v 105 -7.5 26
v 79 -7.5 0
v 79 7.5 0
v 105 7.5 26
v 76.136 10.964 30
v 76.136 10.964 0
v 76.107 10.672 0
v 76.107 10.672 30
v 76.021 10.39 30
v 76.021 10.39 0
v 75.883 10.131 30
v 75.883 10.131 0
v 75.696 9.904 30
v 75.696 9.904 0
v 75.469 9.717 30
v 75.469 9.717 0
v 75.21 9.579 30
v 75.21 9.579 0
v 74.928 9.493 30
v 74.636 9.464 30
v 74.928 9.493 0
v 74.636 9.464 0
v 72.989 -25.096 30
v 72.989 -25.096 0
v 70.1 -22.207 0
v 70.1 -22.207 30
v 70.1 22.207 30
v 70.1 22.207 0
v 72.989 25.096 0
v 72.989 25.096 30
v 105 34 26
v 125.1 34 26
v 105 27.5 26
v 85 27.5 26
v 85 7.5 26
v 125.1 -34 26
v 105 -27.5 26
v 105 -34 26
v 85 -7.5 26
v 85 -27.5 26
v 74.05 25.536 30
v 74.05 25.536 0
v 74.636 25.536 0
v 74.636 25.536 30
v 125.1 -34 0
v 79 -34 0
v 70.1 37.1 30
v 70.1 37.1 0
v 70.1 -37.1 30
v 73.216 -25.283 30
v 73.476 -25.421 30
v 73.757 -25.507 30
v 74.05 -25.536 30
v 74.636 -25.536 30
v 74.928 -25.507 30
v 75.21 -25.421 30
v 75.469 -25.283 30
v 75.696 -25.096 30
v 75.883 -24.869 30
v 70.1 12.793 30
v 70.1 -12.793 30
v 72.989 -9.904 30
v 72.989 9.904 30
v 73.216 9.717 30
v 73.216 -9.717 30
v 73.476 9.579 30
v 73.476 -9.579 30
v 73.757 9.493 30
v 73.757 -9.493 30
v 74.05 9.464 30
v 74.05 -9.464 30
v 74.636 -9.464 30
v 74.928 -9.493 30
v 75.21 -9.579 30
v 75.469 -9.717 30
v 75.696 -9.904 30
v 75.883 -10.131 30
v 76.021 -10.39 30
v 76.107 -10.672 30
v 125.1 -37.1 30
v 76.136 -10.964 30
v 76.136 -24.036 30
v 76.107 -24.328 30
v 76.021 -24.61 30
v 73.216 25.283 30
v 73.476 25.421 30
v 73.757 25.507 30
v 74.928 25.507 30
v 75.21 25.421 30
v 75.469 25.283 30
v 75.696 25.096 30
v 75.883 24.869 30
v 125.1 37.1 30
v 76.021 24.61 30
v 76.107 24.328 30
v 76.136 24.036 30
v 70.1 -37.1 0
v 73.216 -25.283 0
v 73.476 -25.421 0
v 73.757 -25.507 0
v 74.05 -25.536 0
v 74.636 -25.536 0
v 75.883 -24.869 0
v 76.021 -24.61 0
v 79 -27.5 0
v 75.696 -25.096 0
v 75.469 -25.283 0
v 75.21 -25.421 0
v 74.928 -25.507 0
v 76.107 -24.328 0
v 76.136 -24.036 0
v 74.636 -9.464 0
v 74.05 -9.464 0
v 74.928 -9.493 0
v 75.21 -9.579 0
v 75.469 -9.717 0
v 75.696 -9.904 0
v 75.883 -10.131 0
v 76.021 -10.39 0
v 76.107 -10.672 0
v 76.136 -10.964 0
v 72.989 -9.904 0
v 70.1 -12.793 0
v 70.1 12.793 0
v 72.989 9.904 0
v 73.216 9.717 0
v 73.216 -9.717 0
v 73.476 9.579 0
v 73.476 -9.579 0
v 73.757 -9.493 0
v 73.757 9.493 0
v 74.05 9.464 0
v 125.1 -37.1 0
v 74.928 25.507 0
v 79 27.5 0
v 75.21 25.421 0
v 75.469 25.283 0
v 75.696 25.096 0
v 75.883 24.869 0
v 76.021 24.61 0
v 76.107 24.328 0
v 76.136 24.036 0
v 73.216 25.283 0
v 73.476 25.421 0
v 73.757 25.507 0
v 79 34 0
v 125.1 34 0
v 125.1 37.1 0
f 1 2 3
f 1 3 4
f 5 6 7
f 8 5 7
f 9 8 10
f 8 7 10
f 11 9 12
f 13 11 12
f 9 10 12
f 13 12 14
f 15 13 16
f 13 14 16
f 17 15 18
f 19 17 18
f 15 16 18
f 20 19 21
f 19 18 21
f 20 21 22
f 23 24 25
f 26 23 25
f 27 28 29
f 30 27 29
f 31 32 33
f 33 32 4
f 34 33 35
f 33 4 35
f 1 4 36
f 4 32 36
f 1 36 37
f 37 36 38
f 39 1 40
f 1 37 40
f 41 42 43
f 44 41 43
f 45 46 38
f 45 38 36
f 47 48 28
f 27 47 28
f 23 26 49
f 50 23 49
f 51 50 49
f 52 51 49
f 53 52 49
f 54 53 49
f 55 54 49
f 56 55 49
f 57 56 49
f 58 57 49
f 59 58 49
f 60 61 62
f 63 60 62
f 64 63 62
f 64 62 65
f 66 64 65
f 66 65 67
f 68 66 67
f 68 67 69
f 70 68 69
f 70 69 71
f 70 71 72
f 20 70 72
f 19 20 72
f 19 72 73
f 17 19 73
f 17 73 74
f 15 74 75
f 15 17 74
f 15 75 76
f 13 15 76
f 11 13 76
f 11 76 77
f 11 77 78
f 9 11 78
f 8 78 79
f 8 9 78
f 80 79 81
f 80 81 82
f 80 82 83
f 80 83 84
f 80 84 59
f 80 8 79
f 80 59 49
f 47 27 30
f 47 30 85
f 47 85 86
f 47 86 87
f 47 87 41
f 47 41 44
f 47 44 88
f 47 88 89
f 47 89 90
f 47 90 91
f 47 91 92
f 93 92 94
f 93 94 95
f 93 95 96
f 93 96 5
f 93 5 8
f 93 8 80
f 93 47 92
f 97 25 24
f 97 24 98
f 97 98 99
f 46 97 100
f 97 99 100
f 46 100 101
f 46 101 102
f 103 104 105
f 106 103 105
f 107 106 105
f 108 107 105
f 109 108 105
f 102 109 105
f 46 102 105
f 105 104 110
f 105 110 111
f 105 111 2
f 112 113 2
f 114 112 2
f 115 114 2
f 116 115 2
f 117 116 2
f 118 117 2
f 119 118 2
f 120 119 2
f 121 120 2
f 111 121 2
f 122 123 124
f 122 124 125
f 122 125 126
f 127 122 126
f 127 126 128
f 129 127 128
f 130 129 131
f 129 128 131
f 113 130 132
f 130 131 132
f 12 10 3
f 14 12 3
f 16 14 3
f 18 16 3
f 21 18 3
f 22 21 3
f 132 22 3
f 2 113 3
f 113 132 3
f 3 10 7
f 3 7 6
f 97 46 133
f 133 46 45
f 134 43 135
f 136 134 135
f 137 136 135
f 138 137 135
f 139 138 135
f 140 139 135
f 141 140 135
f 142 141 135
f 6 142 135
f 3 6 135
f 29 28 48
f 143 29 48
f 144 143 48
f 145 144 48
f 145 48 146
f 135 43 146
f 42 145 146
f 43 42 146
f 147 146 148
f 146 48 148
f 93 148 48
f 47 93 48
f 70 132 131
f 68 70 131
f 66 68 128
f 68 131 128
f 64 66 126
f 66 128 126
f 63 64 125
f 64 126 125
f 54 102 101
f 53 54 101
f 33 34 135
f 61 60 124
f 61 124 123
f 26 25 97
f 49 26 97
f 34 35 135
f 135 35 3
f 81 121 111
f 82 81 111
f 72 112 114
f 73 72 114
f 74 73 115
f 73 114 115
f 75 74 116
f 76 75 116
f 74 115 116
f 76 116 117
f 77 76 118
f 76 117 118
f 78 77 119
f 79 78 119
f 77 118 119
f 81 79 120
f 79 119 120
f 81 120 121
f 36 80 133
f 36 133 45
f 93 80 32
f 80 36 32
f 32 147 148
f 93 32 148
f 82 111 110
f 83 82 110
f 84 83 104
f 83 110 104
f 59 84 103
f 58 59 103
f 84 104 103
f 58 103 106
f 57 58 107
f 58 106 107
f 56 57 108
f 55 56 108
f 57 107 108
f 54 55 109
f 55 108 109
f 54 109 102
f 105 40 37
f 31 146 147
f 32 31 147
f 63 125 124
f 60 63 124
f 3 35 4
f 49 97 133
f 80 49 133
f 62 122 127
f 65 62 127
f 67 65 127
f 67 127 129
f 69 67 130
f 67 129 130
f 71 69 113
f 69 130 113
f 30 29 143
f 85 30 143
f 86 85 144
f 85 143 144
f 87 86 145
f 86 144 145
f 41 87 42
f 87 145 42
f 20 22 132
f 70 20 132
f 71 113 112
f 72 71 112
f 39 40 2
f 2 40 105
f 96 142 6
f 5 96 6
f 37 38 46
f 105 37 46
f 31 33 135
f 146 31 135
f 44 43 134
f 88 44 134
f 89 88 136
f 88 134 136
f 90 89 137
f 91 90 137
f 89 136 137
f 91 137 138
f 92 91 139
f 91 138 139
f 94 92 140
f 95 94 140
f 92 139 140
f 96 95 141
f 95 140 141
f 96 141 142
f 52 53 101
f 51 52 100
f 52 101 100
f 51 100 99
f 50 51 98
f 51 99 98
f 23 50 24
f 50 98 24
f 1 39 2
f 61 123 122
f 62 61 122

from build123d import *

# Parameters (mm, degrees)
F0_W     = 2.1
F0_H     = 2.1
F1_DEPTH = 30
F4_DEPTH = 34
F5_DEPTH = 27.5
F6_DEPTH = 7.5


with BuildPart() as f1:
    # F0 (on Top) → F1 (new body)
    with BuildSketch(Plane.XY):
        with BuildLine():
            Line((86, -35), (90, -35))
            Line((90, -35), (90, -23))
            Line((90, -23), (90, 23))
            Line((90, 23), (90, 35))
            Line((90, 35), (86, 35))
            Line((86, 35), (80, 35))
            Line((80, 35), (70.1, 35))
            Line((70.1, 35), (70.1, 22.207107))
            Line((70.1, 22.207107), (72.989087, 25.096194))
            ThreePointArc((72.989087, 25.096194), (73.475722, 25.421353), (74.049747, 25.535534))
            Line((74.049747, 25.535534), (74.635534, 25.535534))
            ThreePointArc((74.635534, 25.535534), (75.696194, 25.096194), (76.135534, 24.035534))
            Line((76.135534, 24.035534), (76.135534, 10.964466))
            ThreePointArc((76.135534, 10.964466), (75.696194, 9.903806), (74.635534, 9.464466))
            Line((74.635534, 9.464466), (74.049747, 9.464466))
            ThreePointArc((74.049747, 9.464466), (73.475722, 9.578647), (72.989087, 9.903806))
            Line((72.989087, 9.903806), (70.1, 12.792893))
            Line((70.1, 12.792893), (70.1, -12.792893))
            Line((70.1, -12.792893), (72.989087, -9.903806))
            ThreePointArc((72.989087, -9.903806), (73.475722, -9.578647), (74.049747, -9.464466))
            Line((74.049747, -9.464466), (74.635534, -9.464466))
            ThreePointArc((74.635534, -9.464466), (75.696194, -9.903806), (76.135534, -10.964466))
            Line((76.135534, -10.964466), (76.135534, -24.035534))
            ThreePointArc((76.135534, -24.035534), (75.696194, -25.096194), (74.635534, -25.535534))
            Line((74.635534, -25.535534), (74.049747, -25.535534))
            ThreePointArc((74.049747, -25.535534), (73.475722, -25.421353), (72.989087, -25.096194))
            Line((72.989087, -25.096194), (70.1, -22.207107))
            Line((70.1, -22.207107), (70.1, -35))
            Line((70.1, -35), (80, -35))
            Line((80, -35), (86, -35))
        make_face()
        Polygon((86, 35), (90, 35), (90, 37.1), (70.1, 37.1), (70.1, 35), (80, 35), align=None)
        Polygon((90, -23), (90, -35), (92.1, -35), (92.1, 35), (90, 35), (90, 23), align=None)
        with Locations((91.05, 36.05)):
            Rectangle(F0_W, F0_H)
        Polygon((92.1, 35), (92.1, -35), (92.1, -37.1), (125.1, -37.1), (125.1, 37.1), (92.1, 37.1), align=None)
        Polygon((90, -37.1), (90, -35), (86, -35), (80, -35), (70.1, -35), (70.1, -37.1), align=None)
        with Locations((91.05, -36.05)):
            Rectangle(F0_W, F0_H)
    extrude(amount=F1_DEPTH)

    # F3 (on Front) → F4 (cut, symmetric)
    with BuildSketch(Plane.XZ):
        Polygon((105, 26), (79, 0), (125.1, 0), (125.1, 26), align=None)
    extrude(amount=F4_DEPTH, both=True, mode=Mode.SUBTRACT)

    # F3 (on Front) → F5 (cut, symmetric)
    with BuildSketch(Plane.XZ):
        Polygon((105, 26), (79, 0), (125.1, 0), (125.1, 26), align=None)
        Polygon((85, 26), (79, 0), (105, 26), align=None)
    extrude(amount=F5_DEPTH, both=True, mode=Mode.SUBTRACT)

    # F3 (on Front) → F6 (join, symmetric)
    with BuildSketch(Plane.XZ):
        Polygon((85, 26), (79, 0), (105, 26), align=None)
    extrude(amount=F6_DEPTH, both=True)


solid = f1.part
